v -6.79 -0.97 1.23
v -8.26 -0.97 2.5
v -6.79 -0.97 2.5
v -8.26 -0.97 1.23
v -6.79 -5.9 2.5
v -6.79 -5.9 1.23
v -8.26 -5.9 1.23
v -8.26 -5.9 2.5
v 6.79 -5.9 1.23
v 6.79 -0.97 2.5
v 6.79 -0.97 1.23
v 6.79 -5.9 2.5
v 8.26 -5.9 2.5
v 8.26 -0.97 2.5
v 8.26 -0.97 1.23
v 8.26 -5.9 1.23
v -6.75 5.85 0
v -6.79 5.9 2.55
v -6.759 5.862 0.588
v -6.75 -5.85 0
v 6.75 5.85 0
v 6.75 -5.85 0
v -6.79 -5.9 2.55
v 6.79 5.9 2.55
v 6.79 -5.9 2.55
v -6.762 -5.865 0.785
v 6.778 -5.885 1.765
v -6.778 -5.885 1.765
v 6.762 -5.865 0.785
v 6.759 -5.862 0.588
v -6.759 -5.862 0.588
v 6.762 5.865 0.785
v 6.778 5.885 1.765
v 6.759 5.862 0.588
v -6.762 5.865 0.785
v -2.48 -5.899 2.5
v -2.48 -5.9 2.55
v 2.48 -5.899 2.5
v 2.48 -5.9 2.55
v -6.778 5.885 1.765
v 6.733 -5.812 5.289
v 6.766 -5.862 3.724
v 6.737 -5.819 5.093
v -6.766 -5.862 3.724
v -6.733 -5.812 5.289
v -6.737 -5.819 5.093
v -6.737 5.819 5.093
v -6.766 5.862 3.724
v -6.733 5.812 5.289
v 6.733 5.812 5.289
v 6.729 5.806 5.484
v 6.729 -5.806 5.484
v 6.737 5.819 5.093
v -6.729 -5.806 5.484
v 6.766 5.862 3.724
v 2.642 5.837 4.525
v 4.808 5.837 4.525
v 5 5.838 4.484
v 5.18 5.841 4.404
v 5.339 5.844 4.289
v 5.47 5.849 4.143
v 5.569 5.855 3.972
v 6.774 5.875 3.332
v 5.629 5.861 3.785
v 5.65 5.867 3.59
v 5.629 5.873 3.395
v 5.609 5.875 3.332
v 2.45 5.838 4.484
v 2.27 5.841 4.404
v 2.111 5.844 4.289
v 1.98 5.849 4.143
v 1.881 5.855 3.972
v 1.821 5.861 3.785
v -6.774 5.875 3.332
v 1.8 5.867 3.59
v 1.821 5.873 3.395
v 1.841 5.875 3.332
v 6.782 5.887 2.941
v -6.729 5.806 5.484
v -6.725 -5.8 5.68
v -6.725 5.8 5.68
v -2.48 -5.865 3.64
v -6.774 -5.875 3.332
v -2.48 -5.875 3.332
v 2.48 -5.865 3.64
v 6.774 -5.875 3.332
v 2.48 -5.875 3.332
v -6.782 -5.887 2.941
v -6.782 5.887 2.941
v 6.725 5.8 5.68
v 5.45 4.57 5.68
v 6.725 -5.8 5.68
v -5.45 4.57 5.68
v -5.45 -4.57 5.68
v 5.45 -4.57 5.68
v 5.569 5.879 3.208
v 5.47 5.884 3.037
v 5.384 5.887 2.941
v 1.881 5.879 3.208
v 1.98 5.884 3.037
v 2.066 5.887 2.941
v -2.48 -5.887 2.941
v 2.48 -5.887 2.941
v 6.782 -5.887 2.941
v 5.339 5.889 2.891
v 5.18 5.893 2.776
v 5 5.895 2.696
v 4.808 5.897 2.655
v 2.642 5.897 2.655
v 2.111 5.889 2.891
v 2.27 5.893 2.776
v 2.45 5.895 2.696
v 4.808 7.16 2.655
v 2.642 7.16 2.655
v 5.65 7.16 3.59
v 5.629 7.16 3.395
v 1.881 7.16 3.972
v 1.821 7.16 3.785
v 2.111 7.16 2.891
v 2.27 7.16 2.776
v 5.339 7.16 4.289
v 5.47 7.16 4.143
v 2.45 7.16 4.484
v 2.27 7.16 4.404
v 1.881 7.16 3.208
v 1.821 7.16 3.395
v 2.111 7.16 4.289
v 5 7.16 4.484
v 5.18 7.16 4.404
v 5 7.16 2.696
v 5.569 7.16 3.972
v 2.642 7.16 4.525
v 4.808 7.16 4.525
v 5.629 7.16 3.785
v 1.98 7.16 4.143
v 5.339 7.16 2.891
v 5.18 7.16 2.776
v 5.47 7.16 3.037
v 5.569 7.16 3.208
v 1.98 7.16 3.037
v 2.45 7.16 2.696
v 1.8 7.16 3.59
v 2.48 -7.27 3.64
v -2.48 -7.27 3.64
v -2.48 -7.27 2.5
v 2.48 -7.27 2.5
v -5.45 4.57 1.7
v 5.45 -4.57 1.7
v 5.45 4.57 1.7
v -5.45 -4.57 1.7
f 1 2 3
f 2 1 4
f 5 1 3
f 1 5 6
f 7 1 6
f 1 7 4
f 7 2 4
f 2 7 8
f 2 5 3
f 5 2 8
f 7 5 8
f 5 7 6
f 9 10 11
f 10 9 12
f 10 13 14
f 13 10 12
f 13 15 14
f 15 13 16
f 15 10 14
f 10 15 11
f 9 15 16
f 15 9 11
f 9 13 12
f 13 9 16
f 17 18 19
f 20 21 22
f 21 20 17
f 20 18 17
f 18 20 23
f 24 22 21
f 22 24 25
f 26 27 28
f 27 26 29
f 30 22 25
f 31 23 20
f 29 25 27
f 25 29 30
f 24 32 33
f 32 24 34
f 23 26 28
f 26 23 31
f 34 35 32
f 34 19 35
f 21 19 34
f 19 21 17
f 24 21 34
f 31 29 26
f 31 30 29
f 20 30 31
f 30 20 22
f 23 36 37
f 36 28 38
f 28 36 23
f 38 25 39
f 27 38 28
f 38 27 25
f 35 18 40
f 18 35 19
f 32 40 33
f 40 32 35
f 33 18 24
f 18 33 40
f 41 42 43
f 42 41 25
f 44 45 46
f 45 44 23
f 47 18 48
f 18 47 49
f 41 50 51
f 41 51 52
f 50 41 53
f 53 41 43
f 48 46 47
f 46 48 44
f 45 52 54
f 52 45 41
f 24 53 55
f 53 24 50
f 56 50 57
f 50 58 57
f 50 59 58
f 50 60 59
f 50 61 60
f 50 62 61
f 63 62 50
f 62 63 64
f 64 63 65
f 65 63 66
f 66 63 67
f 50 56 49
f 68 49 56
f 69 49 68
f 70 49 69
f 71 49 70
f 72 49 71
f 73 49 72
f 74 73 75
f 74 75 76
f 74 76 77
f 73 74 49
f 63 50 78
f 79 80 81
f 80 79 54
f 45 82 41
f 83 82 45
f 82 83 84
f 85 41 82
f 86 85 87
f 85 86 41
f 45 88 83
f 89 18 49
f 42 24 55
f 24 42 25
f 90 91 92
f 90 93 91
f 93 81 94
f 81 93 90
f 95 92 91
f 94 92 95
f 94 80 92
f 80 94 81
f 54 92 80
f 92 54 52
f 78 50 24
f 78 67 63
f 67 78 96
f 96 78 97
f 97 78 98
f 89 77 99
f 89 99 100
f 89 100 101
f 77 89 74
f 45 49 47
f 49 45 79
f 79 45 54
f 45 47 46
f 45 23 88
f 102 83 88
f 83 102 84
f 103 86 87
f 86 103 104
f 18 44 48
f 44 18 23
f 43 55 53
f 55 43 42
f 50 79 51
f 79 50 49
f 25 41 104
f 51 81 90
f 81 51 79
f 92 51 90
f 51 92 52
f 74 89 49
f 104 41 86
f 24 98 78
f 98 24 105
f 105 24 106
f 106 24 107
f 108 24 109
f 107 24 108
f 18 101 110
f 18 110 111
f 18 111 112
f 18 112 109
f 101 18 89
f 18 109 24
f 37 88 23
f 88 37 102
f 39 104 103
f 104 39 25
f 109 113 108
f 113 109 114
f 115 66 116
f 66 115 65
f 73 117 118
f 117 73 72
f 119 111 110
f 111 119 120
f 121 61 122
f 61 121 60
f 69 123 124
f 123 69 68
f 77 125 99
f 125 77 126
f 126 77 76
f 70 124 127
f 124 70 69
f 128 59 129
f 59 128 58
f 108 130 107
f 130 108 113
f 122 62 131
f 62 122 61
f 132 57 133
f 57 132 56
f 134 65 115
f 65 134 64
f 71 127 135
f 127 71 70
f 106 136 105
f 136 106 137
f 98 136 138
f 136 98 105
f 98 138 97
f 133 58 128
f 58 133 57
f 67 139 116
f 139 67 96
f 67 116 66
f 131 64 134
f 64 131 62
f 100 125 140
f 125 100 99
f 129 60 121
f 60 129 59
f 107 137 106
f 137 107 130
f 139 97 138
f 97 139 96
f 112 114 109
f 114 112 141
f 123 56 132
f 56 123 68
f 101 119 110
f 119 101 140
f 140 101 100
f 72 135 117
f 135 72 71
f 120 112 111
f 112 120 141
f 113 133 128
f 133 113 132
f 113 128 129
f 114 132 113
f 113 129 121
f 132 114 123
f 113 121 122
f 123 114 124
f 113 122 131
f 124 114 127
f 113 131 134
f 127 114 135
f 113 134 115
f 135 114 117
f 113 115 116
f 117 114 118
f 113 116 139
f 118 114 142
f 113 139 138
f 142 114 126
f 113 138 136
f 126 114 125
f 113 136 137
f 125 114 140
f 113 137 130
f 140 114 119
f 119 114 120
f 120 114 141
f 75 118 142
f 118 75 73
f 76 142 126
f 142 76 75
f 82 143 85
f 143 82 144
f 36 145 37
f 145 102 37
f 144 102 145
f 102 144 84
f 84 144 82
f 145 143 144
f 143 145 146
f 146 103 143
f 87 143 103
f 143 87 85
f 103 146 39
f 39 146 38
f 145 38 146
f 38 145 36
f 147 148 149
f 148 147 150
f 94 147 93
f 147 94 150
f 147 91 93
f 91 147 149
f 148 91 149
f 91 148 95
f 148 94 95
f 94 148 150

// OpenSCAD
// Newton MessagePad 2x00 Modem port cover
// Copyright François Revol, 2025

/* [Printing options] */

// Variant
variant = 0; // [0:Original plain cover,1:MicroSD - UNIMPLEMENTED]


// Optimize for FDM printers (less supports, larger details) - UNIMPLEMENTED
optimize_fdm = true;

/* [Preview] */

preview_parts = true;


/* [Hidden] */
$fs=0.2;

module mp2x00_modem_cover(variant = 0) {
    difference() {
        // positive volumes
        union() {
            linear_extrude(2.55, scale=[13.58/13.5,11.8/11.7]) square([13.5, 11.7], center=true);
            translate([0,0,2.55]) linear_extrude(3.13, scale=[13.45/13.58,11.6/11.8]) square([13.58, 11.8], center=true);
            // little nub on the top
            translate([13.58/2-1.14-3.85/2, 11.8/2-0.1,2.65+1.88/2]) rotate([-90,0,0]) hull() for(dx=[-1,1]) translate([dx*(3.85-1.88)/2,0,0]) cylinder(d=1.88, h=1.36);
            // bottom nub
            translate([0, -11.8/2+0.1,2.5+1.14/2]) rotate([90,0,0]) linear_extrude(1.47) square([4.96,1.14], center=true);
            // side nubs
            for (dx=[-1,1])
                translate([dx*13.58/2, 4.93/2-11.8/2,2.5-1.27/2]) rotate([0,dx*90,0]) linear_extrude(1.47) square([1.27,4.93], center=true);
        }
        translate([0,0,1.7]) linear_extrude(10) square([10.9,9.14], center=true);
    }
    // bbox
    //if ($preview) color("green", 0.2) translate([0,0,5.74/2]) cube([13.6,11.9,5.74], center=true);
}



//color("grey") 
mp2x00_modem_cover(variant);
